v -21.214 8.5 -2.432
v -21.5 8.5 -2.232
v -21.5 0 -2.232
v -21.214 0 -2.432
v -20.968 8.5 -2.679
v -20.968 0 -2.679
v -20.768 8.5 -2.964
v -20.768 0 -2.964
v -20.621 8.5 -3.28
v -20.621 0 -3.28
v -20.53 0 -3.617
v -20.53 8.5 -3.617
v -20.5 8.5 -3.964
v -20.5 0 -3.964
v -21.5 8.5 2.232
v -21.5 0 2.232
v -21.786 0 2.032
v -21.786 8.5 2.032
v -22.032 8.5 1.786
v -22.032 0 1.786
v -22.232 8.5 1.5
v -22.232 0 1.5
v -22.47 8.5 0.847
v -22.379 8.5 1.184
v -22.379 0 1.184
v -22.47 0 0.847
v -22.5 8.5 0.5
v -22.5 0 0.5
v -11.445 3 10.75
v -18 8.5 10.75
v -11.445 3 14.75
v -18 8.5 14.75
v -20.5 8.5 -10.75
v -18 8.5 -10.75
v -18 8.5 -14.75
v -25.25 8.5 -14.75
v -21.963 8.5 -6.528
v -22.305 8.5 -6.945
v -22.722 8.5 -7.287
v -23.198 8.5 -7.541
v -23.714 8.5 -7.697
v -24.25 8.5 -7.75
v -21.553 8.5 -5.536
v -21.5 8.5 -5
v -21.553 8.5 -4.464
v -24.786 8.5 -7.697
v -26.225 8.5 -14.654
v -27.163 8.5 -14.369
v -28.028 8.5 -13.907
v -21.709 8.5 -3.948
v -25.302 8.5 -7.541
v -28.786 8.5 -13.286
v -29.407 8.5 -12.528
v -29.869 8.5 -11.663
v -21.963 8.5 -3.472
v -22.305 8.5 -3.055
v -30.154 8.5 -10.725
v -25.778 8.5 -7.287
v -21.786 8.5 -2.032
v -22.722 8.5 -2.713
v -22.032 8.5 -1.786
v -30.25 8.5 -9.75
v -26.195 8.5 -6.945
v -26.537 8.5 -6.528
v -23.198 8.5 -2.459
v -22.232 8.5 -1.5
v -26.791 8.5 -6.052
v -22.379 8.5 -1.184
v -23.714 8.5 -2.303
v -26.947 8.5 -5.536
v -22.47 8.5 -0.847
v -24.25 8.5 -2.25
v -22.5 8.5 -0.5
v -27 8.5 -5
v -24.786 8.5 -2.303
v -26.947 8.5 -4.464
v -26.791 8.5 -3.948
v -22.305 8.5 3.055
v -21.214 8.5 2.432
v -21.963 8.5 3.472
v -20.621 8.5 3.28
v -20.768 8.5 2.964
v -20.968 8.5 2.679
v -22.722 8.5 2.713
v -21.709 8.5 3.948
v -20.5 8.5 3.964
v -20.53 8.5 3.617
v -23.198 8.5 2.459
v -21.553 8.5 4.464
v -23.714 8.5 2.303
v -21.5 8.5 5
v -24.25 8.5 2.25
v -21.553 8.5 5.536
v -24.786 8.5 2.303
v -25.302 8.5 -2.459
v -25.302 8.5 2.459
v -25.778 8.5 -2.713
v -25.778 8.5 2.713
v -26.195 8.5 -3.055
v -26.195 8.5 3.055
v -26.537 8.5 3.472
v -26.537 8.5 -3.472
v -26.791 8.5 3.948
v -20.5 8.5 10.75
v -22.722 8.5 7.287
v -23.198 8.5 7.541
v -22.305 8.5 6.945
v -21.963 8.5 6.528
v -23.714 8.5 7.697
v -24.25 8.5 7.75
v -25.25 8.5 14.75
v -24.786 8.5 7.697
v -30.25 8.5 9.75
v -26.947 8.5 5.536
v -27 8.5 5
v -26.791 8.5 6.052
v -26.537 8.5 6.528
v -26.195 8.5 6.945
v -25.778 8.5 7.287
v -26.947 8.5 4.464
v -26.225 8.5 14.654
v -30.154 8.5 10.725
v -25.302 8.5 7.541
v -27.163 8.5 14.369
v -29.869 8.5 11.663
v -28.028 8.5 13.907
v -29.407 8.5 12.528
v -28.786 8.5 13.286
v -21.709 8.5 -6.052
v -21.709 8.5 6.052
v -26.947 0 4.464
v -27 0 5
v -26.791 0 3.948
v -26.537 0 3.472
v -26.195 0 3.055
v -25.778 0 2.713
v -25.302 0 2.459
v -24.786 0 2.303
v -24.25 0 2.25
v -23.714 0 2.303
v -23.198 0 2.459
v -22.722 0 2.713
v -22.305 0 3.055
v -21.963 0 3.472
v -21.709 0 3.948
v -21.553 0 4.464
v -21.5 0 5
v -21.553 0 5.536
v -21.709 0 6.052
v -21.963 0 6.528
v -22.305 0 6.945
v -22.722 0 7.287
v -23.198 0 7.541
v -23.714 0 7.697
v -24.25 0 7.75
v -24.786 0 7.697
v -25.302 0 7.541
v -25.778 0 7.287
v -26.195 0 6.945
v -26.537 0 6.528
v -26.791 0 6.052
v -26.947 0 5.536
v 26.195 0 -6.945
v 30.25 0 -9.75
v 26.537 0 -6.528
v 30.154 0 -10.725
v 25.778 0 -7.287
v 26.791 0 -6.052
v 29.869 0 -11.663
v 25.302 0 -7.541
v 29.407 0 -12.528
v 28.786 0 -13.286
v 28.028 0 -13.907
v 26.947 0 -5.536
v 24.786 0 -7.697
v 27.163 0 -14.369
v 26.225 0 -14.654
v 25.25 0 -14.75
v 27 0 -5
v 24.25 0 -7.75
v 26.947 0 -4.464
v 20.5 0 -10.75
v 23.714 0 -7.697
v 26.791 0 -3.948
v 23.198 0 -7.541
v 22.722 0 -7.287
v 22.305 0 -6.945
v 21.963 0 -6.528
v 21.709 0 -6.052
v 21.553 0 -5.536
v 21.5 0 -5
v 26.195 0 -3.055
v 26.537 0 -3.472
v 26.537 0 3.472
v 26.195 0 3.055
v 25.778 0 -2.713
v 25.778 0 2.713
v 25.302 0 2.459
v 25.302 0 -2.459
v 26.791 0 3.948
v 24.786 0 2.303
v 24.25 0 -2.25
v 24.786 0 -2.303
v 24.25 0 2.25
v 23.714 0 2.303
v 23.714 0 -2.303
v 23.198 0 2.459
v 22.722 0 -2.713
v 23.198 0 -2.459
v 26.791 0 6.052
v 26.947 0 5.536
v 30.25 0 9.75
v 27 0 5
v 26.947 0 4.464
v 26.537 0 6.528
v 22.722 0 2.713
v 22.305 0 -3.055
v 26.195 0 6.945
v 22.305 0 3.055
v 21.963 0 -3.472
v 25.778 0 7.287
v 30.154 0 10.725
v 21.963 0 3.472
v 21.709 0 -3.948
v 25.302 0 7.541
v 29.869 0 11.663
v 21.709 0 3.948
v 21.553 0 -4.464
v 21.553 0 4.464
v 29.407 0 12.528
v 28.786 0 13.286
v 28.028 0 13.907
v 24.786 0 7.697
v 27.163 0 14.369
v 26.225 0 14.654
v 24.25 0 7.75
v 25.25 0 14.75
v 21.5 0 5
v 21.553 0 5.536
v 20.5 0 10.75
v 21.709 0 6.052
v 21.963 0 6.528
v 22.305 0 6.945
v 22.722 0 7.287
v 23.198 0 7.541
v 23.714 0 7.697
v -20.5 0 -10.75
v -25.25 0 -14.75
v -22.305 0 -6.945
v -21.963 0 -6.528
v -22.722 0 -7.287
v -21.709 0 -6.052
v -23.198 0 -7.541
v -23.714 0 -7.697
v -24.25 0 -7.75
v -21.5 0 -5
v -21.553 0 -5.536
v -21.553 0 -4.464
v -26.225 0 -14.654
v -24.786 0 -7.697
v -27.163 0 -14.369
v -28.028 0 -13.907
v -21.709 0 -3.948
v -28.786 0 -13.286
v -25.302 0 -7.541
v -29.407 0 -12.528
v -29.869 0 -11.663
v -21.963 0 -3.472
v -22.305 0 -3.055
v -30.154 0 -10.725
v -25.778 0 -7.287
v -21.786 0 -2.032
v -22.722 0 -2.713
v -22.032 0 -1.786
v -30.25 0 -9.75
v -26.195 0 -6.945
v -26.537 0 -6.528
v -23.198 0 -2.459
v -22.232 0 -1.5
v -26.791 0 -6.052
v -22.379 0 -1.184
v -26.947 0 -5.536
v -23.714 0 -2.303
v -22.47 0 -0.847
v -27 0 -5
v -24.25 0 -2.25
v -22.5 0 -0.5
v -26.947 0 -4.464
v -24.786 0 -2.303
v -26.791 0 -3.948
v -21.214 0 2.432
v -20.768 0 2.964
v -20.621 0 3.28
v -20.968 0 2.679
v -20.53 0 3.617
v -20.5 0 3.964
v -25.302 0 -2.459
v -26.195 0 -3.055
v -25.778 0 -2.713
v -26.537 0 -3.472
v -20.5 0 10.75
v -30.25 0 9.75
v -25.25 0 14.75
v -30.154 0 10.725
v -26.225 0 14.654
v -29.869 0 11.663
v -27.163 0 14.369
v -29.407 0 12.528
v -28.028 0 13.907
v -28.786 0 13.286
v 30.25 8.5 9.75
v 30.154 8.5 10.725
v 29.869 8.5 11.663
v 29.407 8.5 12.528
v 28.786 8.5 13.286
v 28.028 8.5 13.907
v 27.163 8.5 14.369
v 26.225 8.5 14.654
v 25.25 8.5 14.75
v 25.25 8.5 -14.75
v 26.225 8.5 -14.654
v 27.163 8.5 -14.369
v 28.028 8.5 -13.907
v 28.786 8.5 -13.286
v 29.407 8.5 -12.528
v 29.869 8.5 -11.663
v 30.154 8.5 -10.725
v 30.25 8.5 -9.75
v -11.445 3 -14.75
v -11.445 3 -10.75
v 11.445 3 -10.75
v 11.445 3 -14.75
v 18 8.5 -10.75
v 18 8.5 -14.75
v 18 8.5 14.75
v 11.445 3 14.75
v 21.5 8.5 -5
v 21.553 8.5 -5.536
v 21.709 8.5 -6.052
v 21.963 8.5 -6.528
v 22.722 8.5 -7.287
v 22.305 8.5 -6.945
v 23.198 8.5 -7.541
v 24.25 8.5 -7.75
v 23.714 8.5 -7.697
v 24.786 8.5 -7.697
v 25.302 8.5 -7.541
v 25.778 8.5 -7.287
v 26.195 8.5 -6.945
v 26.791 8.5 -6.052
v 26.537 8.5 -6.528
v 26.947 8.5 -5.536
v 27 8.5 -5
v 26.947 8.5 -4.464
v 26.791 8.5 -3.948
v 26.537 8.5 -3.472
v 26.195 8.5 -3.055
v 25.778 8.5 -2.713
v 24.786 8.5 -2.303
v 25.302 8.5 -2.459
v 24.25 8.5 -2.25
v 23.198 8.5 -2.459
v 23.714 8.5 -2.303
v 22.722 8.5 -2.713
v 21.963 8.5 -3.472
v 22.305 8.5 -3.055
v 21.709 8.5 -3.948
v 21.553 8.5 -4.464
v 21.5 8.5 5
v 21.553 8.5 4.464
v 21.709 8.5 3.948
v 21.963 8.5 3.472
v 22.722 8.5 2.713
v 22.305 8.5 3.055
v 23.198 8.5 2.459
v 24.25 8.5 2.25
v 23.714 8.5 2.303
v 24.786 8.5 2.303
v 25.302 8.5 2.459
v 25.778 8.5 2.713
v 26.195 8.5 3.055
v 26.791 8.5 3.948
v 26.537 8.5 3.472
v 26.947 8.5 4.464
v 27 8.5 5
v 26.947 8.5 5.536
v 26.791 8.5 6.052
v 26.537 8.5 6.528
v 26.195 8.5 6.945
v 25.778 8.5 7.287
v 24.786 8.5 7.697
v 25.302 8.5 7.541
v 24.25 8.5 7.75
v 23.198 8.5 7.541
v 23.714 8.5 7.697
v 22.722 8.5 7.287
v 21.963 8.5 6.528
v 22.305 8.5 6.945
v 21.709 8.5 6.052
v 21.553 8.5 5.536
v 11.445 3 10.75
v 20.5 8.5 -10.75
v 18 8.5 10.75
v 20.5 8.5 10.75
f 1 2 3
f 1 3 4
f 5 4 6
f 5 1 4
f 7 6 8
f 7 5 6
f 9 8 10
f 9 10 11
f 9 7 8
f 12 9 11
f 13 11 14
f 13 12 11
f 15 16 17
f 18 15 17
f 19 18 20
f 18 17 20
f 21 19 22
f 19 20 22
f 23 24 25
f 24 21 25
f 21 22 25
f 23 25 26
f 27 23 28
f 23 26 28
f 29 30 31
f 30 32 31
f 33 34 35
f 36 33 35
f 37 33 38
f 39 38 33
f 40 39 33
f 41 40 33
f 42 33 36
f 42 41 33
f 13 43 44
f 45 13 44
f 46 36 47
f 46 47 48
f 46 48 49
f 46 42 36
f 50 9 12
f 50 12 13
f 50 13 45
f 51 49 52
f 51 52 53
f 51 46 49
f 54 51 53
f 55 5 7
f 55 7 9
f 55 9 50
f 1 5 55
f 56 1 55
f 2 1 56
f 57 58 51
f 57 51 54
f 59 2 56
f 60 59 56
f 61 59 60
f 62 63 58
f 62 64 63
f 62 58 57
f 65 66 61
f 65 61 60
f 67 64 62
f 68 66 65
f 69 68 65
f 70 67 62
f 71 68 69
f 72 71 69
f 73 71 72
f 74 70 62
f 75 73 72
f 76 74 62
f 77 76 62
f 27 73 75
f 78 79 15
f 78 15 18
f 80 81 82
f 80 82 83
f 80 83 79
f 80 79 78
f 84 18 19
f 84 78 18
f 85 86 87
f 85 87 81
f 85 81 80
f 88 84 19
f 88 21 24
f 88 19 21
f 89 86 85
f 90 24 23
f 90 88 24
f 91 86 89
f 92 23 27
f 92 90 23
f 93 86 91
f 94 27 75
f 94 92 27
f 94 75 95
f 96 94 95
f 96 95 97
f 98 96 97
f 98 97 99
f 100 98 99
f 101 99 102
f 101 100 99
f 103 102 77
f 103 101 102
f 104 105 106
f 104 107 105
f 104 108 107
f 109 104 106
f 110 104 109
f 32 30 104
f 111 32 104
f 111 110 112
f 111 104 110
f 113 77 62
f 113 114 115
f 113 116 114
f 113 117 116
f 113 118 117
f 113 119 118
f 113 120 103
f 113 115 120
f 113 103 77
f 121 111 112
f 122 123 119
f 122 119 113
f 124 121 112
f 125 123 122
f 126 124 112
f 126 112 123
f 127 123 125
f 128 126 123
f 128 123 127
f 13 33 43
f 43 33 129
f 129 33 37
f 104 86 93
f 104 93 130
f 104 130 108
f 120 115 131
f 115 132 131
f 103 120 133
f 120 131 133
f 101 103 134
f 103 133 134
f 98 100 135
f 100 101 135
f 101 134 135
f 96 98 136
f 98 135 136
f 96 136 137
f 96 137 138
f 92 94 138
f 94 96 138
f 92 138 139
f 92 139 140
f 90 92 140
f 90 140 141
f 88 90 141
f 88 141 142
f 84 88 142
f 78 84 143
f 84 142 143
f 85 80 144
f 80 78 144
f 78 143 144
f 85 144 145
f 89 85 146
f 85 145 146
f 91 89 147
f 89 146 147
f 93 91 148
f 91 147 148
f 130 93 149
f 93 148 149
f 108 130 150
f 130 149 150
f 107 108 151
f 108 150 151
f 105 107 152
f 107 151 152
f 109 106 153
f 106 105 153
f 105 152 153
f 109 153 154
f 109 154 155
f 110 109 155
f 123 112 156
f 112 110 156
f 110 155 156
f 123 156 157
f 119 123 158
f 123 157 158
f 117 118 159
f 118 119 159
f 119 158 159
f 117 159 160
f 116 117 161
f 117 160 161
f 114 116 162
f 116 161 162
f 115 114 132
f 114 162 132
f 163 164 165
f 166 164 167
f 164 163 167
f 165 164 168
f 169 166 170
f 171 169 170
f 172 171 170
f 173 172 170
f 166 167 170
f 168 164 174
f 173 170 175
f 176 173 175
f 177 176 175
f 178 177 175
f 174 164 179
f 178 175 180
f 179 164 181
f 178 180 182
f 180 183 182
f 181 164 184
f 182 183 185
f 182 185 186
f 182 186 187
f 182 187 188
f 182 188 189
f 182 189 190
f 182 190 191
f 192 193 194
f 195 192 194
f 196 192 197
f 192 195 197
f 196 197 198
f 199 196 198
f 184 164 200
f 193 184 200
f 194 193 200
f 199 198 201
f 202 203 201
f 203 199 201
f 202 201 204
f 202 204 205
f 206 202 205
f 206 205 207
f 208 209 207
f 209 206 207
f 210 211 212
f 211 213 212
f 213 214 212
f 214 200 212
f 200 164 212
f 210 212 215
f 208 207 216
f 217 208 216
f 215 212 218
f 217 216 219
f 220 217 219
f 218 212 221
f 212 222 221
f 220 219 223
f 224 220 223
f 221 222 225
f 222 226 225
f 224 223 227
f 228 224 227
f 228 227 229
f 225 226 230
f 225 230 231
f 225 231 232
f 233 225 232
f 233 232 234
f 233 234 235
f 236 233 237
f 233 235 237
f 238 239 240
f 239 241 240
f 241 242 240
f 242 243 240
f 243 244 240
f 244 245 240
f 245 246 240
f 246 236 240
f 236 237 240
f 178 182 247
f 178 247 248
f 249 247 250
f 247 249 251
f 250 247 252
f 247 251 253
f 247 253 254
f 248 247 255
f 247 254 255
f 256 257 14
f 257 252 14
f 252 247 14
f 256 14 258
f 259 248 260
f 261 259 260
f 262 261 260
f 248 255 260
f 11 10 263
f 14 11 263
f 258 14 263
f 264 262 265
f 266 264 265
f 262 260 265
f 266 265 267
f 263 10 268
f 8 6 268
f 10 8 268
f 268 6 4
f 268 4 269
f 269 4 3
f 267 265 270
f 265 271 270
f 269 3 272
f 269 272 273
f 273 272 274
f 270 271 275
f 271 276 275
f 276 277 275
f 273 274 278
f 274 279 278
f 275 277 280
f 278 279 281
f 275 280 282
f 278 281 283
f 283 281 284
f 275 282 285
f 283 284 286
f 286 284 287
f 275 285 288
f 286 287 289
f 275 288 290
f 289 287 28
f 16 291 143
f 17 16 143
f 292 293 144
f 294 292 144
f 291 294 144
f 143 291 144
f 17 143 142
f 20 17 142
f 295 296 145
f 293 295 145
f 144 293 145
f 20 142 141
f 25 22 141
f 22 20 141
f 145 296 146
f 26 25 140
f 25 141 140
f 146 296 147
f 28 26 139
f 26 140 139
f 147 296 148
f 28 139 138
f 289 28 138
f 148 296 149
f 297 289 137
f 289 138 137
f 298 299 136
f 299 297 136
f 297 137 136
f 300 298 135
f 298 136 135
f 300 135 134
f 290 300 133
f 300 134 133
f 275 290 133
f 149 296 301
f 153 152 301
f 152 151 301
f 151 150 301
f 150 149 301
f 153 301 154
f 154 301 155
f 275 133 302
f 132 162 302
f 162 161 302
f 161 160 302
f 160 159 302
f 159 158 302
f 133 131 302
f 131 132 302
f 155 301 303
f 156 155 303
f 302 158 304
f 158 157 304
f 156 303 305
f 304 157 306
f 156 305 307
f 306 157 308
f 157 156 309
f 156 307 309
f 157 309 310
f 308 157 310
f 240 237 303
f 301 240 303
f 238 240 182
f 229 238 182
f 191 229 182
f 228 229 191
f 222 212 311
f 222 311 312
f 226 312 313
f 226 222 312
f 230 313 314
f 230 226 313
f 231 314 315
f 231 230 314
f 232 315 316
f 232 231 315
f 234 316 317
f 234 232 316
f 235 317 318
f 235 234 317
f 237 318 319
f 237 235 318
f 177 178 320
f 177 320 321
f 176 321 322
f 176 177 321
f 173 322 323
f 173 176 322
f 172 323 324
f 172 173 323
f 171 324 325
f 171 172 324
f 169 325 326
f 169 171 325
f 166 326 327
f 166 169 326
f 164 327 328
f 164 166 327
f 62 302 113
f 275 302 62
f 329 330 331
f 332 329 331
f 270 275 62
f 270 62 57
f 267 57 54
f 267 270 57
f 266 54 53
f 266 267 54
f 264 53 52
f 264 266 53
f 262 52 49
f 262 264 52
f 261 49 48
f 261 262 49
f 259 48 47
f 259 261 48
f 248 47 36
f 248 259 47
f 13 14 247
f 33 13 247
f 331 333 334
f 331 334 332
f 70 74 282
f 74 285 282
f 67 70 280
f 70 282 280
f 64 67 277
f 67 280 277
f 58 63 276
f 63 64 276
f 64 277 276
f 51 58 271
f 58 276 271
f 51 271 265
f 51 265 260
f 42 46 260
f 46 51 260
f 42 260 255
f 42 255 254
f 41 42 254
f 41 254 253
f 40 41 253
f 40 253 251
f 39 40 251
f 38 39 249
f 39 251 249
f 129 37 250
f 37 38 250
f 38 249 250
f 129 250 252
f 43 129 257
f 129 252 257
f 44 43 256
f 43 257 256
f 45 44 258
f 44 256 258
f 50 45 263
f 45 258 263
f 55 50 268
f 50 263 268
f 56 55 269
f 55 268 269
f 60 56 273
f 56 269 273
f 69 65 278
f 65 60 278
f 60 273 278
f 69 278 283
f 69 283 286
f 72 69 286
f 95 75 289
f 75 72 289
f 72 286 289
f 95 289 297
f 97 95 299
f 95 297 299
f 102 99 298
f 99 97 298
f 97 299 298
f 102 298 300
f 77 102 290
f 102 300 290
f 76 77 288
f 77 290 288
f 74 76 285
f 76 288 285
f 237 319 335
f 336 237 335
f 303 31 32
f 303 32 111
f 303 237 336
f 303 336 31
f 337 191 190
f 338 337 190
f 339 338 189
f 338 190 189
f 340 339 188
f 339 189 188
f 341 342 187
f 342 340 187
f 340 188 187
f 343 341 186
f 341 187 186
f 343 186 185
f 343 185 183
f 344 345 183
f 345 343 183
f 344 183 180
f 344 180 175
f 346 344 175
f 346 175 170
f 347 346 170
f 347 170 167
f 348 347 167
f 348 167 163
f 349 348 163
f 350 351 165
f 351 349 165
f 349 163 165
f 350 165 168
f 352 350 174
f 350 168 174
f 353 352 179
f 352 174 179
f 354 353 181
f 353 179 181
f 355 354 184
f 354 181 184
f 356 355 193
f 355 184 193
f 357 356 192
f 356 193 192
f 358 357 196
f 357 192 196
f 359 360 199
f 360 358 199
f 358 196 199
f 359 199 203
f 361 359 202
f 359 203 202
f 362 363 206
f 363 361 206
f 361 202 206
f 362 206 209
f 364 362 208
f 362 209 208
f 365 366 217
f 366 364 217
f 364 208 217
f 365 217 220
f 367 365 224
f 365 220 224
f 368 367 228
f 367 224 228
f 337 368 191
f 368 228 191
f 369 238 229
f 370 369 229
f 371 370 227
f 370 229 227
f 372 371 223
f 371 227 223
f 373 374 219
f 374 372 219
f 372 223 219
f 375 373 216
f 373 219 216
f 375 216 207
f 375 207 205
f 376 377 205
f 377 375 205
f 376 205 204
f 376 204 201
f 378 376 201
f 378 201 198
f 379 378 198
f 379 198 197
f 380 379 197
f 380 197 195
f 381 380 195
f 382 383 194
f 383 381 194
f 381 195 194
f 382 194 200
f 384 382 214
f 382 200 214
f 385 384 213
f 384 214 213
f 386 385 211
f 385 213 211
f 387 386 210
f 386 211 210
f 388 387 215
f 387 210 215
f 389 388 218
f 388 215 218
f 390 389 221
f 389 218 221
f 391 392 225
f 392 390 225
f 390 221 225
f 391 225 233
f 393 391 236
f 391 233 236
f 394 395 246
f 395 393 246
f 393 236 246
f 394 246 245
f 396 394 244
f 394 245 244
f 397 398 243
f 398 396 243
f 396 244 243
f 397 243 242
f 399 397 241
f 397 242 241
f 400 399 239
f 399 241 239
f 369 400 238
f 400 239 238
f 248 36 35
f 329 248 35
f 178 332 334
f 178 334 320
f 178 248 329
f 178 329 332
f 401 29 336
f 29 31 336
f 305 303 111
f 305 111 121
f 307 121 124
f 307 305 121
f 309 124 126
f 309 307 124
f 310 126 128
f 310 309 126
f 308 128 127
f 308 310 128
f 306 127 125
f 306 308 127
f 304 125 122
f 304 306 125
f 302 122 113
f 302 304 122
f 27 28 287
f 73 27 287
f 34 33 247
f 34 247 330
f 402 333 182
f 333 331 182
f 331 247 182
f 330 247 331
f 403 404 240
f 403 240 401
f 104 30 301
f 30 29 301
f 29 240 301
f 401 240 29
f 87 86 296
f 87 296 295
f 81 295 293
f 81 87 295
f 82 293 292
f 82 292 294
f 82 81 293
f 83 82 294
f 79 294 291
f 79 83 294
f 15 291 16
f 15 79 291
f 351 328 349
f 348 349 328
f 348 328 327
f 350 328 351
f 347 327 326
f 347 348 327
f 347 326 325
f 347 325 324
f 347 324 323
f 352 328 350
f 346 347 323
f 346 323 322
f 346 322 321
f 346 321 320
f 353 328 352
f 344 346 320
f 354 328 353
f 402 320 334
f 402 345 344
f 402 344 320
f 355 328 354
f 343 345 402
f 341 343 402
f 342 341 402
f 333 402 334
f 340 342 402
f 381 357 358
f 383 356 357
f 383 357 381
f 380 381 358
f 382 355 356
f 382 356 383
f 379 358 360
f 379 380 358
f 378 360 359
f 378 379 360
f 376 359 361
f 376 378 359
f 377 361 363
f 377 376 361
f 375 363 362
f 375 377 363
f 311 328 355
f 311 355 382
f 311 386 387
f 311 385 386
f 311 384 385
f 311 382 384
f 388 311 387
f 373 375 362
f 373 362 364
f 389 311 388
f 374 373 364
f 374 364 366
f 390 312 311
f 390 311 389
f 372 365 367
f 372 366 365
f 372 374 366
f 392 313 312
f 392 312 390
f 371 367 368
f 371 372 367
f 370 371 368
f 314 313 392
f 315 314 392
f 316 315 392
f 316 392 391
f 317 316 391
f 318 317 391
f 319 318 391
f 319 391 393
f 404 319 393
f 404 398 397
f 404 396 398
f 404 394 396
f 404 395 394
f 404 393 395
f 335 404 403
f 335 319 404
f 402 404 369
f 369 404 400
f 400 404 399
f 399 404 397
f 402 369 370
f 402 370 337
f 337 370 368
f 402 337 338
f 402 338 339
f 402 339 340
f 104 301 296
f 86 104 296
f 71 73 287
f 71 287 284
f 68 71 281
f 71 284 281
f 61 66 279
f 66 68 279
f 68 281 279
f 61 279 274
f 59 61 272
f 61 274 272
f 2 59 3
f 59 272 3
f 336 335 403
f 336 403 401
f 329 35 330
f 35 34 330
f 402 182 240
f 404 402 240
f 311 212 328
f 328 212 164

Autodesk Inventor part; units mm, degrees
ref_plane "YZ Plane" through (0, 0, 0) normal (1, 0, 0) x (0, 1, 0)
ref_plane "XZ Plane" through (0, 0, 0) normal (0, 1, 0) x (-1, 0, 0)
ref_plane "XY Plane" through (0, 0, 0) normal (0, 0, 1) x (1, 0, 0)
sketch "Sketch1" plane through (0, 0, 0) normal (0, 1, 0) x (-1, 0, 0)
  line L0 (-20.5, 10.75) -> (20.5, 10.75)
  line L1 (20.5, 10.75) -> (20.5, -10.75)
  line L2 (20.5, -10.75) -> (-20.5, -10.75)
  line L3 (-20.5, -10.75) -> (-20.5, 10.75)
  line L4 (-20.5, 10.75) -> (20.5, -10.75) construction
  line L5 (20.5, 10.75) -> (-20.5, -10.75) construction
  line L6 (-24.25, 5) -> (24.25, 5) construction
  line L7 (24.25, 5) -> (24.25, -5) construction
  line L8 (24.25, -5) -> (-24.25, -5) construction
  line L9 (-24.25, -5) -> (-24.25, 5) construction
  line L10 (-24.25, 5) -> (24.25, -5) construction
  line L11 (24.25, 5) -> (-24.25, -5) construction
  circle A0 centre (24.25, 5) radius 2.75
  circle A1 centre (24.25, -5) radius 2.75
  circle A2 centre (-24.25, 5) radius 2.75
  circle A3 centre (-24.25, -5) radius 2.75
  line L12 (30.25, 9.75) -> (30.25, -9.75)
  line L13 (25.25, -14.75) -> (0, -14.75)
  line L14 (25.25, 14.75) -> (0, 14.75)
  line L15 (0, 14.75) -> (0, 0) construction
  line L16 (0, 0) -> (0, -14.75) construction
  arc A4 (30.25, 9.75) -> (25.25, 14.75) centre (25.25, 9.75) ccw
  arc A5 (25.25, -14.75) -> (30.25, -9.75) centre (25.25, -9.75) ccw
  line L17 (20.5, 2.5) -> (20.5, 2.5)
  line L18 (22.5, 0.5) -> (22.5, -0.5)
  line L19 (20.5, -2.5) -> (20.5, -2.5)
  line L20 (20.5, -2.5) -> (20.5, 2.5)
  line L21 (20.5, 2.5) -> (22.5, -2.5) construction
  line L22 (22.5, 2.5) -> (20.5, -2.5) construction
  line L23 (21.5, 0) -> (0, 0) construction
  line L24 (-30.25, 9.75) -> (-30.25, -9.75)
  line L25 (-25.25, -14.75) -> (0, -14.75)
  line L26 (-25.25, 14.75) -> (0, 14.75)
  arc A6 (-25.25, 14.75) -> (-30.25, 9.75) centre (-25.25, 9.75) ccw
  arc A7 (-30.25, -9.75) -> (-25.25, -14.75) centre (-25.25, -9.75) ccw
  arc A8 (22.5, 0.5) -> (20.5, 2.5) centre (20.5, 0.5) ccw
  arc A9 (20.5, -2.5) -> (22.5, -0.5) centre (20.5, -0.5) ccw
  line L27 (-20.5, 2.5) -> (-20.5, 2.5)
  line L28 (-22.5, 0.5) -> (-22.5, -0.5)
  line L29 (-20.5, -2.5) -> (-20.5, -2.5)
  line L30 (-20.5, -2.5) -> (-20.5, 2.5)
  line L31 (-20.5, 2.5) -> (-22.5, -2.5) construction
  line L32 (-22.5, 2.5) -> (-20.5, -2.5) construction
  arc A10 (-20.5, 2.5) -> (-22.5, 0.5) centre (-20.5, 0.5) ccw
  arc A11 (-22.5, -0.5) -> (-20.5, -2.5) centre (-20.5, -0.5) ccw
  point P0 (20.5, 2.5)
  point P1 (20.5, -2.5)
  point P2 (-21.5, 0)
  point P3 (-20.5, -2.5)
  point P4 (-20.5, 2.5)
  point P5 (20.5, 3.5)
  point P6 (20.5, -3.5)
  point P7 (-20.5, -3.5)
  point P8 (-20.5, 3.5)
  dimension "d0" = 21.5
  dimension "d1" = 41
  dimension "d2" = 5.5
  dimension "d3" = 48.5
  dimension "d4" = 10
  dimension "d5" = 4
  dimension "d6" = 4
  dimension "d7" = 6
  dimension "d8" = 5
  dimension "d9" = 5
  dimension "d10" = 5
  dimension "d11" = 2
  dimension "d12" = 2
extrude "Extrusion1" add sketch "Sketch1" along normal blind 8.5 contours L3 A11 L28 A10 | L12 A5 L13 L25 A7 L24 A6 L26 L14 A4
sketch "Sketch2" plane through (-25.25, 0, 14.75) normal (0, 0, 1) x (1, 0, 0)
  line L0 (0, 8.5) -> (50.5, 8.5) construction
  line L1 (7.25, 8.5) -> (13.8046, 3)
  line L2 (13.8046, 3) -> (25.25, 3)
  line L3 (25.25, 3) -> (25.25, 8.5)
  line L4 (7.25, 8.5) -> (25.25, 8.5)
  line L5 (43.25, 8.5) -> (36.6954, 3)
  line L6 (36.6954, 3) -> (25.25, 3)
  line L7 (43.25, 8.5) -> (25.25, 8.5)
  point P0 (25.25, 0)
  dimension "d15" = 18
  dimension "d16" = 40
  dimension "d17" = 3
extrude "Extrusion2" cut sketch "Sketch2" against normal through all
fillet "Fillet1" radius 2 2 edges at (-20.5, 4.25, 2.5) (-20.5, 4.25, -2.5)
equation "\"d6\" = d5"
properties part number "CH_01_0035_servo_mount" material "Acetal Resin, Black"
